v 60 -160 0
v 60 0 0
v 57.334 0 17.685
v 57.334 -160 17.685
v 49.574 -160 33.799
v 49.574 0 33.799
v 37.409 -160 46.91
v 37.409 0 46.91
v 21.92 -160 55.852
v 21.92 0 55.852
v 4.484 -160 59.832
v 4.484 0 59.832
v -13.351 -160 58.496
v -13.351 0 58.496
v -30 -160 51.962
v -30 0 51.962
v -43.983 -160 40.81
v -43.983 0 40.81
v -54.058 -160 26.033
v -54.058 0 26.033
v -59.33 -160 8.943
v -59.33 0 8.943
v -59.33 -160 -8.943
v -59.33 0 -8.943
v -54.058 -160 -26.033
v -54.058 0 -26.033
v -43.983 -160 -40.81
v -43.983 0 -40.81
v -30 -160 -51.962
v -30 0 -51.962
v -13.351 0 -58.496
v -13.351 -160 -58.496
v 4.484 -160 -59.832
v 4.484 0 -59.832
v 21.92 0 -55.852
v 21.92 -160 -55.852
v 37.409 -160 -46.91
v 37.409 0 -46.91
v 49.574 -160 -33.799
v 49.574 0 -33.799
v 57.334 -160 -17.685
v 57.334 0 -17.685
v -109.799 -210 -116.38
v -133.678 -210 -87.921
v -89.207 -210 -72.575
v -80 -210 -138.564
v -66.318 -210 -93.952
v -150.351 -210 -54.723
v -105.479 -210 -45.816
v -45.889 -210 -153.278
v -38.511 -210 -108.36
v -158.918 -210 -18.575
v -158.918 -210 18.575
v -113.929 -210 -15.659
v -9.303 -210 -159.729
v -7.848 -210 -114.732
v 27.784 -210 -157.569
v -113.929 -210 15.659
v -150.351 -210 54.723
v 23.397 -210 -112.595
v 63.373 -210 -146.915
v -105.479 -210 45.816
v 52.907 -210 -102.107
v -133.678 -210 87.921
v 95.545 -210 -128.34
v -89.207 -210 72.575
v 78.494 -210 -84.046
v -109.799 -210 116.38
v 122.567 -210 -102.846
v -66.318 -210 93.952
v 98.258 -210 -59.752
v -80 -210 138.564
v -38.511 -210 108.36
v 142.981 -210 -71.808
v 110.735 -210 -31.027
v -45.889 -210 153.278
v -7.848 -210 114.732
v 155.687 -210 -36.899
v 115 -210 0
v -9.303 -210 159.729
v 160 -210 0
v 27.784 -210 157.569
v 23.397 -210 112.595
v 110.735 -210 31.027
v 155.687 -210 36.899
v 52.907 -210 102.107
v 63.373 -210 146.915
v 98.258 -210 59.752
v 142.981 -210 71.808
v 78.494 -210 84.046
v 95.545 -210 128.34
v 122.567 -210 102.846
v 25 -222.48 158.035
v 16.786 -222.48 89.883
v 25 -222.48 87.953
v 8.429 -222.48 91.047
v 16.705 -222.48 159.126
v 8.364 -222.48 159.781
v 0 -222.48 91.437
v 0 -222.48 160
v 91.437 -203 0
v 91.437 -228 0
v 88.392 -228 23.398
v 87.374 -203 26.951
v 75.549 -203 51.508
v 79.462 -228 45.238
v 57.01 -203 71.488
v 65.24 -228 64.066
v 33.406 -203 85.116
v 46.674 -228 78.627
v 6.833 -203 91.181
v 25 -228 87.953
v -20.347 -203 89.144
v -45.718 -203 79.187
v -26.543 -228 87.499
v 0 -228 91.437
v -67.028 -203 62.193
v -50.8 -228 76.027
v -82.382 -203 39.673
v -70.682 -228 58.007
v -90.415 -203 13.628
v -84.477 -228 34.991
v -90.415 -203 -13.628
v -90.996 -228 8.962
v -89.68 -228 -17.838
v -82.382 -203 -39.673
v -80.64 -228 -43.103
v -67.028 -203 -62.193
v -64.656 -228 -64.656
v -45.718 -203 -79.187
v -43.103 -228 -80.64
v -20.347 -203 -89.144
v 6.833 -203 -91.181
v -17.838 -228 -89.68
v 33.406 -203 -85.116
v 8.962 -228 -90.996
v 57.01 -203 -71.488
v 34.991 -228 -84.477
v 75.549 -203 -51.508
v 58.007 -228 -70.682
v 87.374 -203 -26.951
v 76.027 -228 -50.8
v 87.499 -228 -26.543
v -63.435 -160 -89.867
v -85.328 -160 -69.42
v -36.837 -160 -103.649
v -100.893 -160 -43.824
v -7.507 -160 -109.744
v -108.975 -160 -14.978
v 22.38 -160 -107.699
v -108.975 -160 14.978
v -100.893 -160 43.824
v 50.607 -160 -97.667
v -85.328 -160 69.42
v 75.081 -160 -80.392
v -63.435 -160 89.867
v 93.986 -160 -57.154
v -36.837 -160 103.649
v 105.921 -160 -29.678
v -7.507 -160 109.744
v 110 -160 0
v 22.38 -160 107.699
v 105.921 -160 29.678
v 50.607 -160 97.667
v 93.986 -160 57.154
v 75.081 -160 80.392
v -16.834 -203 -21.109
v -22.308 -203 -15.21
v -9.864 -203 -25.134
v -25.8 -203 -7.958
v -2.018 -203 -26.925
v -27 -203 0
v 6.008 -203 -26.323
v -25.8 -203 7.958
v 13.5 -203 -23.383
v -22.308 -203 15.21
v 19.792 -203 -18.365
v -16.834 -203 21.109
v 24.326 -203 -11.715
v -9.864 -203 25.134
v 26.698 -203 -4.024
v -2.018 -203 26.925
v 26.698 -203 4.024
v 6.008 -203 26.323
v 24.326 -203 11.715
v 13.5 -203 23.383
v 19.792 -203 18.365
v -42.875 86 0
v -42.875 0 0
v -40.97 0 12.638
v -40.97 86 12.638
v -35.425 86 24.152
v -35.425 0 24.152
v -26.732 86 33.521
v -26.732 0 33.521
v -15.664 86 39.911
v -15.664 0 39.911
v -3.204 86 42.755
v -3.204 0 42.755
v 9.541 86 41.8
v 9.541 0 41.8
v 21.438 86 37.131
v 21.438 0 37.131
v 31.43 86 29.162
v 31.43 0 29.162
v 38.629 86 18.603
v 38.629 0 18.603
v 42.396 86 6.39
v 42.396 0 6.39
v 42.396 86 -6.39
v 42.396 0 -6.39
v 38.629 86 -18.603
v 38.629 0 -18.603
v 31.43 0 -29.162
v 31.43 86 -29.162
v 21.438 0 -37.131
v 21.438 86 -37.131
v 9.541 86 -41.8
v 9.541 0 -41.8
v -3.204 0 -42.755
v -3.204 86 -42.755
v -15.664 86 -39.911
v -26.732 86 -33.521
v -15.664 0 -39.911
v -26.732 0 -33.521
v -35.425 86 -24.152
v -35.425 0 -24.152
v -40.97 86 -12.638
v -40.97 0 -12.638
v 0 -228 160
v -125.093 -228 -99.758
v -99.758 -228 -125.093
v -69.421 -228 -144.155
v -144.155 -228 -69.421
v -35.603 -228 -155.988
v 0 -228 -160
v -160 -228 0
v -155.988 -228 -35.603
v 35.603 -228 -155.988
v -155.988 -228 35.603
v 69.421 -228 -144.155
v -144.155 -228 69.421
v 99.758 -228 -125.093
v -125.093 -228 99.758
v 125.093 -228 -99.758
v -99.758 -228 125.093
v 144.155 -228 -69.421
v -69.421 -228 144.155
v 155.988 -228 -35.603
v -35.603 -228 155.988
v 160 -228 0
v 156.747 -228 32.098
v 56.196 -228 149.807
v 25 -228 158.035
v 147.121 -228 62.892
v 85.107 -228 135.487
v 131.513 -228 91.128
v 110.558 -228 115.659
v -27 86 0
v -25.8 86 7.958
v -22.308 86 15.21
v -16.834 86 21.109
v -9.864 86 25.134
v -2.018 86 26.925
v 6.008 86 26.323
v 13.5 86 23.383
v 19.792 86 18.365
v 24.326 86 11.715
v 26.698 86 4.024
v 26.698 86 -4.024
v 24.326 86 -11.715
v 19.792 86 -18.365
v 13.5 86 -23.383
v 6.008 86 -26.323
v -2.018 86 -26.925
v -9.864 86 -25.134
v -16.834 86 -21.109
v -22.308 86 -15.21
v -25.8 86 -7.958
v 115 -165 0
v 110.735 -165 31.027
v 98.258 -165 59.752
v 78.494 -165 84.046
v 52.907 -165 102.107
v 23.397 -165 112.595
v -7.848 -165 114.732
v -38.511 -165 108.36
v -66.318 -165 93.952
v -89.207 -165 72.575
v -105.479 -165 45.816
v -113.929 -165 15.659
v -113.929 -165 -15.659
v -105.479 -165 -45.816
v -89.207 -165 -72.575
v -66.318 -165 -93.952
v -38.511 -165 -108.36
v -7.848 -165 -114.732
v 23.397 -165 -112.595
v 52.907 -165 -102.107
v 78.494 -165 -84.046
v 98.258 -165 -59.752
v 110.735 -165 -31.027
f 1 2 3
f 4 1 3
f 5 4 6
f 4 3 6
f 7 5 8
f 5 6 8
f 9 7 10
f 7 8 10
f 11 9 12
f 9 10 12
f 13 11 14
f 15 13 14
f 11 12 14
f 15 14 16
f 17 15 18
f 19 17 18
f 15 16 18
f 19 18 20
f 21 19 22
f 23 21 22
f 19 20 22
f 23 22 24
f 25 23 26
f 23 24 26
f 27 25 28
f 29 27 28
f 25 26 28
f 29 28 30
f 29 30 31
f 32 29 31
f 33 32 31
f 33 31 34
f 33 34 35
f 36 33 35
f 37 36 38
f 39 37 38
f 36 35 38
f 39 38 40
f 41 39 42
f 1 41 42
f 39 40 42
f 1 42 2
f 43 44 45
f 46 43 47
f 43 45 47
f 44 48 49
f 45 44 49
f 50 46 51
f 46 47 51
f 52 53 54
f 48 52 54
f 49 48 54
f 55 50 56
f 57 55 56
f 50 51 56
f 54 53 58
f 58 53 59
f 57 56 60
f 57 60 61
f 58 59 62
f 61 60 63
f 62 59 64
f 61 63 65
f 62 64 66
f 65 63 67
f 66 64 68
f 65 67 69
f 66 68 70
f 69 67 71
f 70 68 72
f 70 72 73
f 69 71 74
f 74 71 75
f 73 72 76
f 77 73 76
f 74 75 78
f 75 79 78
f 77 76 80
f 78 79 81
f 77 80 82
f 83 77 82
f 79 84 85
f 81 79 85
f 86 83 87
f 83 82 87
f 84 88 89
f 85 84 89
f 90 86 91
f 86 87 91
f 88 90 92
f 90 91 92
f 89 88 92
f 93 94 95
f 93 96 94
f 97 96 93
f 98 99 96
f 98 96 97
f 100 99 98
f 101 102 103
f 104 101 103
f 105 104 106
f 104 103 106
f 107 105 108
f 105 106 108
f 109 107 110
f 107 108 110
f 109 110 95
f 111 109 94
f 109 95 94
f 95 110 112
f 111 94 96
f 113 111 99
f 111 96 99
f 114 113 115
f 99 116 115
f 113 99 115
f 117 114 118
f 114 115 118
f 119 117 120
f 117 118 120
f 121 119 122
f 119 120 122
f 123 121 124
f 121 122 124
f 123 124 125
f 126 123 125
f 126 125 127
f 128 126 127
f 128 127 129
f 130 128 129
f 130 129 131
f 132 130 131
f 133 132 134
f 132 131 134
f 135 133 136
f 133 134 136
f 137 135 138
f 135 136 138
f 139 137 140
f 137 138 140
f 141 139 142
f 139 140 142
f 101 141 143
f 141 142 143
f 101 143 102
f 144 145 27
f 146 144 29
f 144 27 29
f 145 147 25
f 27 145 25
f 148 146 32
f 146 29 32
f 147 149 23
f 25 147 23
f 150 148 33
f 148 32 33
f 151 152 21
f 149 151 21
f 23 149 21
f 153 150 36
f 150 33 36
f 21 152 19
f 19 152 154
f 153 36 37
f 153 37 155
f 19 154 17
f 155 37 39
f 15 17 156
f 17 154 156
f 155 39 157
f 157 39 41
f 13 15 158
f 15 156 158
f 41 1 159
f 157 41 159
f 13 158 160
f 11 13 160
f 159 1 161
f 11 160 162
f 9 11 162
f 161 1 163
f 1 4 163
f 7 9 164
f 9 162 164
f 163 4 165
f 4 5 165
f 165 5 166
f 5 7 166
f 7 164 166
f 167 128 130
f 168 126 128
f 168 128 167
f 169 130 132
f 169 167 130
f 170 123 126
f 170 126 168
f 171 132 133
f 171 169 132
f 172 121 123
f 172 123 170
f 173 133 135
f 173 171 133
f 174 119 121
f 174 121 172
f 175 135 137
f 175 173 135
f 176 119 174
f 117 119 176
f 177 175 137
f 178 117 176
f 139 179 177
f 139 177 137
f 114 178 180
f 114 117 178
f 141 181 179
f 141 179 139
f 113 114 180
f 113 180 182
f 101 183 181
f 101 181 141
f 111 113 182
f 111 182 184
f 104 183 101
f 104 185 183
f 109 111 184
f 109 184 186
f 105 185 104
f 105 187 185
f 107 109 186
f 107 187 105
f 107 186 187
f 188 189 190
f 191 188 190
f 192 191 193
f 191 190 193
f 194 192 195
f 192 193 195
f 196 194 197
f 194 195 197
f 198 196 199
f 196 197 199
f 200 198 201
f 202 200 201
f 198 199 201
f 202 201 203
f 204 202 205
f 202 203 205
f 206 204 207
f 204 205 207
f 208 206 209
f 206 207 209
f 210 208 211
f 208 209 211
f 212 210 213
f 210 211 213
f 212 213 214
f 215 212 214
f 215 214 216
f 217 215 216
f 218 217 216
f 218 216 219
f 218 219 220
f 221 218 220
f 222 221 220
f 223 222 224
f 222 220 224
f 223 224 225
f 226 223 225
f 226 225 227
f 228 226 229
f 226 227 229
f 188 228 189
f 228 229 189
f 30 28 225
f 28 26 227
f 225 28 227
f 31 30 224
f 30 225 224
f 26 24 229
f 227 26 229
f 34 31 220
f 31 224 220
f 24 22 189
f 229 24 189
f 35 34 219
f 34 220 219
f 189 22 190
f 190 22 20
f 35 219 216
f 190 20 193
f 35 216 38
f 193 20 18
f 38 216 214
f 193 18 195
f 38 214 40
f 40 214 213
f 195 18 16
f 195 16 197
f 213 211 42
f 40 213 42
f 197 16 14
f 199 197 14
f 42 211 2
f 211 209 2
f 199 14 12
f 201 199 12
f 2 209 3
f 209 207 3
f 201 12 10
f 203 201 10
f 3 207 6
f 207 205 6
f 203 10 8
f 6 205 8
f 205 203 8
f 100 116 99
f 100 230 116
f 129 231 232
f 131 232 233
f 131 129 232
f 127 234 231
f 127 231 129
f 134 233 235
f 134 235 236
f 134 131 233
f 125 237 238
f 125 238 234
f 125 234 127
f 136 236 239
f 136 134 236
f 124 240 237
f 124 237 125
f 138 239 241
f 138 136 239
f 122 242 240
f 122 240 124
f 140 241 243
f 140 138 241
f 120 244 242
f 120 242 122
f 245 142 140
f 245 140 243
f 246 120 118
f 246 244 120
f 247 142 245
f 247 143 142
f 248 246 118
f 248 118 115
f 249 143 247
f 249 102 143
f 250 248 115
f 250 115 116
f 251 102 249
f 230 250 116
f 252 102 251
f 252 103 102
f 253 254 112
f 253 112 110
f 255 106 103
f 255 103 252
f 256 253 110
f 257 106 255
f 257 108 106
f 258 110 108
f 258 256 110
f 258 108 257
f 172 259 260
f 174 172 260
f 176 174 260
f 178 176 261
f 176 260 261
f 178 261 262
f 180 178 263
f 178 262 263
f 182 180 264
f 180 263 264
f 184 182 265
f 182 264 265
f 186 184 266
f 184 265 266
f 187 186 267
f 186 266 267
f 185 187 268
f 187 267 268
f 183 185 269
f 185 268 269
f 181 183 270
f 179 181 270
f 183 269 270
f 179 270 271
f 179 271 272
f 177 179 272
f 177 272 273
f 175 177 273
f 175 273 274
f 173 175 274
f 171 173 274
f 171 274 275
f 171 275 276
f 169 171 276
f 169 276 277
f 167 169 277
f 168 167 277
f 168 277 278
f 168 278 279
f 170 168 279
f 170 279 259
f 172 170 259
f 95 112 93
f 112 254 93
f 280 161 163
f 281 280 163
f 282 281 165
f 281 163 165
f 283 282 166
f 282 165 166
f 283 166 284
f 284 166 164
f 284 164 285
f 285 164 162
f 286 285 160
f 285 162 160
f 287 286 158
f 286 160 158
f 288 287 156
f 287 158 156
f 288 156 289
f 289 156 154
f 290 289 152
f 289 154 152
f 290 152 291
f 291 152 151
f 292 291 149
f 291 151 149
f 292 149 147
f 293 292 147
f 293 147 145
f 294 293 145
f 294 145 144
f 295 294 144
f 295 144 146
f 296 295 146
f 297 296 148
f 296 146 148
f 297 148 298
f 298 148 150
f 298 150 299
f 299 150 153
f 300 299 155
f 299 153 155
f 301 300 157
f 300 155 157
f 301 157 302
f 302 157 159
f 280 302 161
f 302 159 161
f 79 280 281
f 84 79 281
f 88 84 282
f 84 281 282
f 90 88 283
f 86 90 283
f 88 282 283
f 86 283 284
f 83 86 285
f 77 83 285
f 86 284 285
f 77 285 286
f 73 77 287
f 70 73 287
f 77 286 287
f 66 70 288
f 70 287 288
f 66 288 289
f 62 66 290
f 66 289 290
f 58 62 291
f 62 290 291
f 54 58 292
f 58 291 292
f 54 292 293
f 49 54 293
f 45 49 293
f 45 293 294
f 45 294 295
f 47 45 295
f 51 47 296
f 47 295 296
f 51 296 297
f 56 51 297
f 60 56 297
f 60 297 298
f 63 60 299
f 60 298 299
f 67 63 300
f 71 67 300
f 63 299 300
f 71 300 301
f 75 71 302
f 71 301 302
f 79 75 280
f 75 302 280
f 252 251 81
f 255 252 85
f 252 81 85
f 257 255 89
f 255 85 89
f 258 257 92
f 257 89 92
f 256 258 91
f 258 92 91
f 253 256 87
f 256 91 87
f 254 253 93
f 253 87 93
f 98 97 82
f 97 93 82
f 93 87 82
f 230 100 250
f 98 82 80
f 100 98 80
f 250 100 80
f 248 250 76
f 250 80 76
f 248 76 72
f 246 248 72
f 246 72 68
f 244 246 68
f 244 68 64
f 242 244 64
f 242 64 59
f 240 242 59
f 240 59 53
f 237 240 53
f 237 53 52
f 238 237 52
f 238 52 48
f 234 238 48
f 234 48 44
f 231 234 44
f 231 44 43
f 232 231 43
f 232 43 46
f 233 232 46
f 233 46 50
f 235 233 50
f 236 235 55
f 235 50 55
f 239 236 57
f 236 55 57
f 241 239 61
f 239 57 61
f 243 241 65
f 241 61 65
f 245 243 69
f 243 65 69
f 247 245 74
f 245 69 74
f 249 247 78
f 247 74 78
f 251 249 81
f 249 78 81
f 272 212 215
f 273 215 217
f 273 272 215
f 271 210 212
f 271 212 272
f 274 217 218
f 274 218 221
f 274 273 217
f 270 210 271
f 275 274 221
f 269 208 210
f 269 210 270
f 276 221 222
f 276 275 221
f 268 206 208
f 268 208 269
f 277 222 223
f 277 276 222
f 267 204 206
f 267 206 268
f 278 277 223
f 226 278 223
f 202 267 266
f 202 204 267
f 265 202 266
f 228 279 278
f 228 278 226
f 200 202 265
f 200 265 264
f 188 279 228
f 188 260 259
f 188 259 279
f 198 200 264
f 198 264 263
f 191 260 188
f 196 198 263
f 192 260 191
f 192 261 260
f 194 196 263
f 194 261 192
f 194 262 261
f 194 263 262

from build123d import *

# Parameters (mm, degrees)
F0_R      = 60
F1_DEPTH  = 160
F2_R      = 115
F3_DEPTH  = 50
F4_R      = 160
F5_DEPTH  = 18
F6_SIZE   = 5
F7_R      = 42.875
F8_DEPTH  = 86
F9_R      = 27
F10_DEPTH = 430
F11_R     = 91.436725
F12_DEPTH = 25
F13_W     = 16.456575
F13_H     = 102.537059
F14_DEPTH = 25


with BuildPart() as f1:
    # F0 (on Front) → F1 (new body)
    with BuildSketch(Plane.XZ):
        Circle(F0_R)
    extrude(amount=F1_DEPTH)

    # F2 (on face) → F3 (join)
    with BuildSketch(Plane.XZ.offset(160)):
        Circle(F2_R)
    extrude(amount=F3_DEPTH)

    # F4 (on face) → F5 (join)
    with BuildSketch(Plane.XZ.offset(210)):
        Circle(F4_R)
    extrude(amount=F5_DEPTH)

    # F6
    f6_edges = [f1.edges().sort_by_distance(p)[0] for p in [
        (-115, -160, 0),
    ]]
    chamfer(f6_edges, length=F6_SIZE)

    # F7 (on face) → F8 (join)
    with BuildSketch(Plane(origin=(0, 0, 0), x_dir=(-1, 0, 0), z_dir=(0, 1, 0))):
        Circle(F7_R)
    extrude(amount=F8_DEPTH)

    # F9 (on face) → F10 (cut)
    with BuildSketch(Plane(origin=(0, 86, 0), x_dir=(-1, 0, 0), z_dir=(0, 1, 0))):
        Circle(F9_R)
    extrude(amount=-F10_DEPTH, mode=Mode.SUBTRACT)

    # F11 (on face) → F12 (cut)
    with BuildSketch(Plane.XZ.offset(228)):
        Circle(F11_R)
    extrude(amount=-F12_DEPTH, mode=Mode.SUBTRACT)

    # F13 (on Right) → F14 (cut)
    with BuildSketch(Plane.YZ):
        with Locations((-230.708375, 115.195948)):
            Rectangle(F13_W, F13_H)
    extrude(amount=F14_DEPTH, mode=Mode.SUBTRACT)


solid = f1.part
